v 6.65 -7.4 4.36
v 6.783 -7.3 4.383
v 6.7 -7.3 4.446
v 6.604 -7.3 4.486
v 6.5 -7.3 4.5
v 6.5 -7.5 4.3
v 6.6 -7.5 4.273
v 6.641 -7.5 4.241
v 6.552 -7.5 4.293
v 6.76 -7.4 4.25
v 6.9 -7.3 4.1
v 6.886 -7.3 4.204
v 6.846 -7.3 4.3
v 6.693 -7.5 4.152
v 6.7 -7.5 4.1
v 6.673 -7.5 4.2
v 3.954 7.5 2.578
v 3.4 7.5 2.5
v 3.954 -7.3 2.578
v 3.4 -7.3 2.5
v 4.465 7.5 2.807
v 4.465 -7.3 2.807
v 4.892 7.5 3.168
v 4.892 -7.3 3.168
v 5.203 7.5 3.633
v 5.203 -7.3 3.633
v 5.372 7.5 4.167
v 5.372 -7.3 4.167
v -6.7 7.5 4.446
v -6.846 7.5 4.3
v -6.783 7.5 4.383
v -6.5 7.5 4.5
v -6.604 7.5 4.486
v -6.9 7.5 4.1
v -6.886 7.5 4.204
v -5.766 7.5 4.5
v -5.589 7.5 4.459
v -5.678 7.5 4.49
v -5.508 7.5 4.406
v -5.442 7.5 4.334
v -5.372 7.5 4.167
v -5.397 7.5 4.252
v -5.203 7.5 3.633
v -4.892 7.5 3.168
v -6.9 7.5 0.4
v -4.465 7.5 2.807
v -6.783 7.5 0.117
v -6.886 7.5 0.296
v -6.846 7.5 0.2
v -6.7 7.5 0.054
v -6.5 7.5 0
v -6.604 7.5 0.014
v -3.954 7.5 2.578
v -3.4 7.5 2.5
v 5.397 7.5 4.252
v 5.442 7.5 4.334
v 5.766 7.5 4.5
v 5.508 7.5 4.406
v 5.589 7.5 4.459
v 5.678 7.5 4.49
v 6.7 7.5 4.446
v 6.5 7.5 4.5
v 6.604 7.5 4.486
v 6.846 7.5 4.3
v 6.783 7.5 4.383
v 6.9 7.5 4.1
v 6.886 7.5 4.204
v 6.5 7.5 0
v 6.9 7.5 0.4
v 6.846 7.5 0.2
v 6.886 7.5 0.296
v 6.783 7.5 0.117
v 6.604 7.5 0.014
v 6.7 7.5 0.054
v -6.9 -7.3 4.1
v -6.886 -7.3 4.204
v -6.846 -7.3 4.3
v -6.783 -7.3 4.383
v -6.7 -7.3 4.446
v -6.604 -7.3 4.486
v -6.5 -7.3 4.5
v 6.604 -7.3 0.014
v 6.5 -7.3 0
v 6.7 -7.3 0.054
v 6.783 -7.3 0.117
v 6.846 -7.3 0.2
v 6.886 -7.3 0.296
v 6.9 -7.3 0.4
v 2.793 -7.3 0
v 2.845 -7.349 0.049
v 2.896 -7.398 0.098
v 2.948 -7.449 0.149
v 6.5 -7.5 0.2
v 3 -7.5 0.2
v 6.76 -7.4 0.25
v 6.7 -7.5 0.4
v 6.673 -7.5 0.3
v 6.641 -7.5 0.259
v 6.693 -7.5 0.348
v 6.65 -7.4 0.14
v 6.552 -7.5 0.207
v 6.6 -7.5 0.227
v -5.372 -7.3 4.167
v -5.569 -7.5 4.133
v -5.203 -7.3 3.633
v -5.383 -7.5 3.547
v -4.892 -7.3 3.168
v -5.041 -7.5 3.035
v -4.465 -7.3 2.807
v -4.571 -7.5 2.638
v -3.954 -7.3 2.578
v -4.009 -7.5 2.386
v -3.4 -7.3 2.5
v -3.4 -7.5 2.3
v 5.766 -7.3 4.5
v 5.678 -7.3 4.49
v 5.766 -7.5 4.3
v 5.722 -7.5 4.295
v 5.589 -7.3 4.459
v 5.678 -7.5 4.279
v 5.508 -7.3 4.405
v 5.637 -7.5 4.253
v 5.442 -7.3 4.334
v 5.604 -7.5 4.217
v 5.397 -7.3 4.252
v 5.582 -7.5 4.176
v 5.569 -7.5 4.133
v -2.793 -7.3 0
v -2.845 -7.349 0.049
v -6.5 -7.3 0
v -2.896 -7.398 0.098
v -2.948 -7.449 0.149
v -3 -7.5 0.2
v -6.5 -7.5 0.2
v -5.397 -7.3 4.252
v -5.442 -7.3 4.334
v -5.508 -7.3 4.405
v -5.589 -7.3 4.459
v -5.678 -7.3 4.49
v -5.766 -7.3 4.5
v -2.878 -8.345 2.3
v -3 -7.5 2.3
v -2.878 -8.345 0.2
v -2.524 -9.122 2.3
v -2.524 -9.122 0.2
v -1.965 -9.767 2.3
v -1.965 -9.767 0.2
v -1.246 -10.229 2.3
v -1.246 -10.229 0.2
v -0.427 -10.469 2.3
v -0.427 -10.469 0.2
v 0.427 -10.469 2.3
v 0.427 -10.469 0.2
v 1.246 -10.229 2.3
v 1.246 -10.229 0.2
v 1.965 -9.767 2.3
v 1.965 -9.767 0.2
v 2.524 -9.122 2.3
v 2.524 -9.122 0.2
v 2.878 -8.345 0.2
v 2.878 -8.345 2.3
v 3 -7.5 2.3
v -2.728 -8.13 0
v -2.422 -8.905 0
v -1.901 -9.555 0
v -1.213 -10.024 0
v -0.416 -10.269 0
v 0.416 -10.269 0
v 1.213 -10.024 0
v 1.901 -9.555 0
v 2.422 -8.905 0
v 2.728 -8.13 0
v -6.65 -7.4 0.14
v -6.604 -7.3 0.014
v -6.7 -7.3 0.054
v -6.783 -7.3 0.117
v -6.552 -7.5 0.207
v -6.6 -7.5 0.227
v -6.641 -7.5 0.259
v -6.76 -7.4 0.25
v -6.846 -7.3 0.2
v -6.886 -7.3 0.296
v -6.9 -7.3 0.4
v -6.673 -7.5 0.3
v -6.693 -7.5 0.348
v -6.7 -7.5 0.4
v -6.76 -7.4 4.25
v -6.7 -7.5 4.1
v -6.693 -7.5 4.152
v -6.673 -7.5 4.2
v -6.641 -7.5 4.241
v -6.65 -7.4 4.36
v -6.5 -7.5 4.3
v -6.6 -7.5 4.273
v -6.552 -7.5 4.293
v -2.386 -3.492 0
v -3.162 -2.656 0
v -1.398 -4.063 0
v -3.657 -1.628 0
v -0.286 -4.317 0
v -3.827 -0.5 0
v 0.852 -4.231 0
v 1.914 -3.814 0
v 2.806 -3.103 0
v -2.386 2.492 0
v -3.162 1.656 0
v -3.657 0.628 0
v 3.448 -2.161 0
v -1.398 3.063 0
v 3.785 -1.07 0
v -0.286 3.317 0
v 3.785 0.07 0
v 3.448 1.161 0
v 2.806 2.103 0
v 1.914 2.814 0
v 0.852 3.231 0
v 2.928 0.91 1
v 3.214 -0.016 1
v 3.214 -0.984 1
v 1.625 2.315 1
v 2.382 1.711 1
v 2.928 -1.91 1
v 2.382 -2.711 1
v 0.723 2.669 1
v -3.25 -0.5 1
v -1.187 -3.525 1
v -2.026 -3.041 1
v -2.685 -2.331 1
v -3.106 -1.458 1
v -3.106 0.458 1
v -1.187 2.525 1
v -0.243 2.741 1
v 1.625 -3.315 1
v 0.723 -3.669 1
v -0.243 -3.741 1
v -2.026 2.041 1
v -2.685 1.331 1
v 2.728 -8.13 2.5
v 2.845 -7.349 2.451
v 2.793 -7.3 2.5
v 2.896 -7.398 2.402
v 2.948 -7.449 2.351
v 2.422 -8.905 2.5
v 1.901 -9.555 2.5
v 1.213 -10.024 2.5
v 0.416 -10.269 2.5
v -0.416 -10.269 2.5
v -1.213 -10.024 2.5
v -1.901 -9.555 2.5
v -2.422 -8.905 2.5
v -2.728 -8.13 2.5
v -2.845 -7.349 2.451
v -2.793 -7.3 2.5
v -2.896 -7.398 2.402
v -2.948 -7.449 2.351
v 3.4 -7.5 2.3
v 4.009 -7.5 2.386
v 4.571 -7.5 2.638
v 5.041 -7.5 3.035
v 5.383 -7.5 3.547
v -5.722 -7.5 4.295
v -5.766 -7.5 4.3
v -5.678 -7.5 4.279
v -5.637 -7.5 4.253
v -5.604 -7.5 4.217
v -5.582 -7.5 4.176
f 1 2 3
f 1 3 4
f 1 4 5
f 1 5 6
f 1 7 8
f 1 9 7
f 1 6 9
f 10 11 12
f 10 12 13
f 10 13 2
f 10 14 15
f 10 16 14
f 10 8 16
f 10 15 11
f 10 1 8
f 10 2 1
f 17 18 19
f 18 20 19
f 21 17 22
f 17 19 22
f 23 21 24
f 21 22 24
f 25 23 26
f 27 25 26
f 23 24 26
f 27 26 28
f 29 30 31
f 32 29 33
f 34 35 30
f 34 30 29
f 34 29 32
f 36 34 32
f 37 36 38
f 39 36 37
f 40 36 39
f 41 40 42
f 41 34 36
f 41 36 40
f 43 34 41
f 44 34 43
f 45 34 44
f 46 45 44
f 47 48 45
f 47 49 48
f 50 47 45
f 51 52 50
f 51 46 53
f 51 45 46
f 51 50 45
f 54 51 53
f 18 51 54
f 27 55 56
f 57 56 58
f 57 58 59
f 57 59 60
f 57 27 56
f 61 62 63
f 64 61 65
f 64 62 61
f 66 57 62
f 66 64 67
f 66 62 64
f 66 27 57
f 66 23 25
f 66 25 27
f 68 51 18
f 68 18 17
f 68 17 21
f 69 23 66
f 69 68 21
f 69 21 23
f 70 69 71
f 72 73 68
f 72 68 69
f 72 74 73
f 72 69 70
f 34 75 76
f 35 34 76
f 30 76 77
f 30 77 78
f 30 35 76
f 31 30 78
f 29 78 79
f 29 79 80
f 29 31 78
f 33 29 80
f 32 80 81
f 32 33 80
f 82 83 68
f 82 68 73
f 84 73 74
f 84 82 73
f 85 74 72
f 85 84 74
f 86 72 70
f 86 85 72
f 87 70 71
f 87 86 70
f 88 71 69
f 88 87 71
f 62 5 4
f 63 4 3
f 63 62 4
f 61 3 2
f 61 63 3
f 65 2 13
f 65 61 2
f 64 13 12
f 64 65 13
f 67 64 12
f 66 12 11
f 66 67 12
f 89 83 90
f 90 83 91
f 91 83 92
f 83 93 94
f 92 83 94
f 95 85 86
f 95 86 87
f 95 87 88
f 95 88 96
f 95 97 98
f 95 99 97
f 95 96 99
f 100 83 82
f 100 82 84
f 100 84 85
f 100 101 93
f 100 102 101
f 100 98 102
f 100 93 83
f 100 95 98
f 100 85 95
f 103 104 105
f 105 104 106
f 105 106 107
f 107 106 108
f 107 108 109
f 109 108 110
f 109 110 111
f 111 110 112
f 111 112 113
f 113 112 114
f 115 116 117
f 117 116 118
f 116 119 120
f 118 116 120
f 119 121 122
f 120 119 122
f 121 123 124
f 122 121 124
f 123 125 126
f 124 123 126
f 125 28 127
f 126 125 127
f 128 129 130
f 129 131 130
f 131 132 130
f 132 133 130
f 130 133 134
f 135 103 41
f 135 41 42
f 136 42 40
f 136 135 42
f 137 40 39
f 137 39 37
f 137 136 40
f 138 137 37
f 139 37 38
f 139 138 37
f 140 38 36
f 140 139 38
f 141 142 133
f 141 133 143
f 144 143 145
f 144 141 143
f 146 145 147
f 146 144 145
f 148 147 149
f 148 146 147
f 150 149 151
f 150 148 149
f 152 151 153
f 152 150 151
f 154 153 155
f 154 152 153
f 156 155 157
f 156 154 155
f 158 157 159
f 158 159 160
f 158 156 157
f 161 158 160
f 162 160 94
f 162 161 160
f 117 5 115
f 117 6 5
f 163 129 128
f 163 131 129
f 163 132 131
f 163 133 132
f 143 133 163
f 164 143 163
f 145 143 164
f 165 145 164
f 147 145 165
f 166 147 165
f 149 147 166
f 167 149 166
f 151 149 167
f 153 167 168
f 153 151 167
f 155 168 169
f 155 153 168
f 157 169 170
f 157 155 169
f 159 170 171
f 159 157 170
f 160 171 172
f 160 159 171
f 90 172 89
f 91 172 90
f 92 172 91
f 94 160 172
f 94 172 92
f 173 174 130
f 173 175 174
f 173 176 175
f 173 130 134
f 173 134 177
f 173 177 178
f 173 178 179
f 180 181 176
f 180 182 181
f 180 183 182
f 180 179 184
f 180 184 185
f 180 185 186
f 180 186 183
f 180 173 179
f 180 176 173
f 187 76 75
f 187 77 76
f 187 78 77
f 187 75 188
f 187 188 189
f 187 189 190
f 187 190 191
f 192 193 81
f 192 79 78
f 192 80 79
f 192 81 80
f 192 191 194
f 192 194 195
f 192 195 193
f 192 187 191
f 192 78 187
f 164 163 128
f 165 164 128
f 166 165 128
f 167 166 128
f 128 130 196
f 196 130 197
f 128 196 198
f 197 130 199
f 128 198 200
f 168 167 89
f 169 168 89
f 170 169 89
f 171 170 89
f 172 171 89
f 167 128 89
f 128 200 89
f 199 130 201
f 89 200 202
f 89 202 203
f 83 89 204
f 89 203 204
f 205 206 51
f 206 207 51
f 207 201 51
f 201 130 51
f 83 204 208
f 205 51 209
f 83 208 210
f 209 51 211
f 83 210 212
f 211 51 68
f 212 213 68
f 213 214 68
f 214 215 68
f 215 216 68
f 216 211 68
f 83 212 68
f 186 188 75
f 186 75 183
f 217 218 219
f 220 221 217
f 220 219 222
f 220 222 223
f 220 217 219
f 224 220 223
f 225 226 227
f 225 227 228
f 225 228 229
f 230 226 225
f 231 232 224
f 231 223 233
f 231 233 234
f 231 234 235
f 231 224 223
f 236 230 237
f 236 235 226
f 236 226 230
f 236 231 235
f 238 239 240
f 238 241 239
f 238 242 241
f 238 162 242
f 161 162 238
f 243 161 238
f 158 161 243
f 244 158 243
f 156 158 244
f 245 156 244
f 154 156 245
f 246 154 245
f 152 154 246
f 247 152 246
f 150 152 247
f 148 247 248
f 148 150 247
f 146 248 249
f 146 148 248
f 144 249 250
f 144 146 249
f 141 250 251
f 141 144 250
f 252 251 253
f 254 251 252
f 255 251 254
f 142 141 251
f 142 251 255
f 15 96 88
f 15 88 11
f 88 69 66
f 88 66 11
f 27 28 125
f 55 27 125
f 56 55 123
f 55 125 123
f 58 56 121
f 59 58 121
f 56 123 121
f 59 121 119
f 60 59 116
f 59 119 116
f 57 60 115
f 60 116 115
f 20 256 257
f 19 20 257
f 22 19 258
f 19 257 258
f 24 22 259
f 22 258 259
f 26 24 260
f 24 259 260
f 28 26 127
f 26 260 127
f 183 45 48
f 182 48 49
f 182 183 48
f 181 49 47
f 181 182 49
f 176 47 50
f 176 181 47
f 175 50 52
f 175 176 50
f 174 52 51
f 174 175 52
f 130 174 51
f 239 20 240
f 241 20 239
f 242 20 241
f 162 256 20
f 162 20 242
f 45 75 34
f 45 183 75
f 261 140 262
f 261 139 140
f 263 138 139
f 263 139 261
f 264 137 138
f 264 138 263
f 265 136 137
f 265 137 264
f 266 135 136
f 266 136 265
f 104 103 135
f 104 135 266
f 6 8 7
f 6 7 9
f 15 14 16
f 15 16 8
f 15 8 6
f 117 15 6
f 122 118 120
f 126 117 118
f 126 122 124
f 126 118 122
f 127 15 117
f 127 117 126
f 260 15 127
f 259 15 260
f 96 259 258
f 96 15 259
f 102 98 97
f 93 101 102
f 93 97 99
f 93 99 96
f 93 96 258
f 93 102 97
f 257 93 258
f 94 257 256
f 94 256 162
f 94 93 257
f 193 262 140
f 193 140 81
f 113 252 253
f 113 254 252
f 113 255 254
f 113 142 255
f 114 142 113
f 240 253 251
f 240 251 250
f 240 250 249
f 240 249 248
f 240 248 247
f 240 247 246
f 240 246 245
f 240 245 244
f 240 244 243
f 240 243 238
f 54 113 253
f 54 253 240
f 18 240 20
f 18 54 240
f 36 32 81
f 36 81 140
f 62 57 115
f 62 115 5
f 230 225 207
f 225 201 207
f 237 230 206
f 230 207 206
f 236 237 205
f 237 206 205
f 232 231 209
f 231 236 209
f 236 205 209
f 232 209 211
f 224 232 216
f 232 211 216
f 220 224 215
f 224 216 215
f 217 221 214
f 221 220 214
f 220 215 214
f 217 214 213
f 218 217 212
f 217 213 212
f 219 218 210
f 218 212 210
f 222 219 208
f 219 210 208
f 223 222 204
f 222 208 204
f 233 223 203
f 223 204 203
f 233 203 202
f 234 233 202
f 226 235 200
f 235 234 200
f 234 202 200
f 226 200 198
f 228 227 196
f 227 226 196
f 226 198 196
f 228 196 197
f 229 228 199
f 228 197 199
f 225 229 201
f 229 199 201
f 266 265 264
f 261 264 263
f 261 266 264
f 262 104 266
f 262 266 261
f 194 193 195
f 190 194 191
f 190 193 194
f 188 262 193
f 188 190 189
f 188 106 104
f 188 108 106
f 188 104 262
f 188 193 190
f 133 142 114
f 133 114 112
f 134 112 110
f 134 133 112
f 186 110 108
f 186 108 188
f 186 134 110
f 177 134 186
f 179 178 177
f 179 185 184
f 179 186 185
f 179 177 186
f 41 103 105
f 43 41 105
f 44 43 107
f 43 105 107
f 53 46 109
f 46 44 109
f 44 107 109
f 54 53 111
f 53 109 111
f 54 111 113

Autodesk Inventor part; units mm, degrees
ref_plane "YZ Plane" through (0, 0, 0) normal (1, 0, 0) x (0, 1, 0)
ref_plane "XZ Plane" through (0, 0, 0) normal (0, 1, 0) x (-1, 0, 0)
ref_plane "XY Plane" through (0, 0, 0) normal (0, 0, 1) x (1, 0, 0)
sketch "Sketch1" plane through (0, 0, 0) normal (0, 0, 1) x (1, 0, 0)
  line L0 (-6.9, 7.5) -> (6.9, 7.5)
  line L1 (6.9, 7.5) -> (6.9, -7.5)
  line L2 (6.9, -7.5) -> (-6.9, -7.5)
  line L3 (-6.9, -7.5) -> (-6.9, 7.5)
  line L4 (0, -10.5) -> (0, 10.5) projected
  line L5 (-9.66, 0) -> (9.66, 0) projected
  point P0 (0, 0)
  dimension "d0" = 13.8
  dimension "d9" = 15
extrude "Extrusion1" add sketch "Sketch1" along normal blind 2.5
sketch "Sketch3" plane through (0, 0, 2.5) normal (0, 0, 1) x (1, 0, 0)
  line L0 (6.9, 7.5) -> (-6.9, 7.5) projected
  line L1 (-6.9, -7.5) -> (6.9, -7.5) projected
  line L2 (-6.9, 7.5) -> (-5.4, 7.5)
  line L3 (-5.4, 7.5) -> (-5.4, -7.5)
  line L4 (-5.4, -7.5) -> (-6.9, -7.5)
  line L5 (-6.9, -7.5) -> (-6.9, 7.5)
  line L6 (6.9, -7.5) -> (6.9, 7.5) projected
  line L7 (6.9, 7.5) -> (5.4, 7.5)
  line L8 (5.4, 7.5) -> (5.4, -7.5)
  line L9 (5.4, -7.5) -> (6.9, -7.5)
  line L10 (6.9, -7.5) -> (6.9, 7.5)
  point P0 (0, 0)
  point P1 (5.4, 7.5)
  point P2 (5.4, -7.5)
  dimension "d11" = 1.5
  dimension "d12" = 1.5
extrude "Extrusion3" add sketch "Sketch3" along normal blind 2 contours L6 L1 L8 L0 | L3 L1 L5 L0
fillet "Fillet2" radius 2 2 edges at (-5.4, 0, 2.5) (5.4, 0, 2.5)
fillet "Fillet2" radius 0.4 6 edges at (-5.4, 0, 4.5) (-6.9, 0, 4.5) (5.4, 0, 4.5) (6.9, 0, 4.5) (6.9, 0, 0) (-6.9, 0, 0)
sketch "Sketch4" plane through (0, 0, 2.5) normal (0, 0, 1) x (1, 0, 0)
  line L0 (-3.4, -7.5) -> (3.4, -7.5) projected
  arc A0 (-3, -7.5) -> (3, -7.5) centre (0, -7.5) ccw
  point P0 (0, 0)
  dimension "d17" = 3
extrude "Extrusion4" add sketch "Sketch4" against normal up to surface (2.5 mm away)
sketch "Sketch5" plane through (0, 0, 0) normal (0, 0, -1) x (-1, 0, 0)
  circle A0 centre (0, -0.5) radius 3.25
  line L0 (-3, -7.5) -> (-6.5, -7.5) construction
  line L1 (0, -15.3299) -> (0, 11.305) projected
  arc A1 (-3, -7.5) -> (3, -7.5) centre (0, -7.5) ccw projected
  point P0 (0, 0)
  dimension "d20" = 6.5
  dimension "d21" = 7
extrude "Extrusion5" cut sketch "Sketch5" against normal blind 1
chamfer "Chamfer2" distance 0.2 angle 45 16 edges at (0, -10.5, 2.5) (0, -10.5, 0) (-4.75, -7.5, 0) (6.7828, -7.5, 4.3828) (-6.7828, -7.5, 0.1172) (6.9, -7.5, 2.25) (6.1332, -7.5, 4.5) (-6.1332, -7.5, 4.5) (5.5082, -7.5, 4.4055) (-5.5082, -7.5, 4.4055) (-6.7828, -7.5, 4.3828) (4.6911, -7.5, 2.9725) (-4.6911, -7.5, 2.9725) (-3.2001, -7.5, 2.5) (3.2001, -7.5, 2.5) (-6.9, -7.5, 2.25)
chamfer "Chamfer3" distance 1 angle 30 1 edges at (3.25, -0.5, 0) measured on face at (-3.2395, -0.7615, 0.6667)
properties part number "Test_SampleHolder_Plate_M8Screw_big"
